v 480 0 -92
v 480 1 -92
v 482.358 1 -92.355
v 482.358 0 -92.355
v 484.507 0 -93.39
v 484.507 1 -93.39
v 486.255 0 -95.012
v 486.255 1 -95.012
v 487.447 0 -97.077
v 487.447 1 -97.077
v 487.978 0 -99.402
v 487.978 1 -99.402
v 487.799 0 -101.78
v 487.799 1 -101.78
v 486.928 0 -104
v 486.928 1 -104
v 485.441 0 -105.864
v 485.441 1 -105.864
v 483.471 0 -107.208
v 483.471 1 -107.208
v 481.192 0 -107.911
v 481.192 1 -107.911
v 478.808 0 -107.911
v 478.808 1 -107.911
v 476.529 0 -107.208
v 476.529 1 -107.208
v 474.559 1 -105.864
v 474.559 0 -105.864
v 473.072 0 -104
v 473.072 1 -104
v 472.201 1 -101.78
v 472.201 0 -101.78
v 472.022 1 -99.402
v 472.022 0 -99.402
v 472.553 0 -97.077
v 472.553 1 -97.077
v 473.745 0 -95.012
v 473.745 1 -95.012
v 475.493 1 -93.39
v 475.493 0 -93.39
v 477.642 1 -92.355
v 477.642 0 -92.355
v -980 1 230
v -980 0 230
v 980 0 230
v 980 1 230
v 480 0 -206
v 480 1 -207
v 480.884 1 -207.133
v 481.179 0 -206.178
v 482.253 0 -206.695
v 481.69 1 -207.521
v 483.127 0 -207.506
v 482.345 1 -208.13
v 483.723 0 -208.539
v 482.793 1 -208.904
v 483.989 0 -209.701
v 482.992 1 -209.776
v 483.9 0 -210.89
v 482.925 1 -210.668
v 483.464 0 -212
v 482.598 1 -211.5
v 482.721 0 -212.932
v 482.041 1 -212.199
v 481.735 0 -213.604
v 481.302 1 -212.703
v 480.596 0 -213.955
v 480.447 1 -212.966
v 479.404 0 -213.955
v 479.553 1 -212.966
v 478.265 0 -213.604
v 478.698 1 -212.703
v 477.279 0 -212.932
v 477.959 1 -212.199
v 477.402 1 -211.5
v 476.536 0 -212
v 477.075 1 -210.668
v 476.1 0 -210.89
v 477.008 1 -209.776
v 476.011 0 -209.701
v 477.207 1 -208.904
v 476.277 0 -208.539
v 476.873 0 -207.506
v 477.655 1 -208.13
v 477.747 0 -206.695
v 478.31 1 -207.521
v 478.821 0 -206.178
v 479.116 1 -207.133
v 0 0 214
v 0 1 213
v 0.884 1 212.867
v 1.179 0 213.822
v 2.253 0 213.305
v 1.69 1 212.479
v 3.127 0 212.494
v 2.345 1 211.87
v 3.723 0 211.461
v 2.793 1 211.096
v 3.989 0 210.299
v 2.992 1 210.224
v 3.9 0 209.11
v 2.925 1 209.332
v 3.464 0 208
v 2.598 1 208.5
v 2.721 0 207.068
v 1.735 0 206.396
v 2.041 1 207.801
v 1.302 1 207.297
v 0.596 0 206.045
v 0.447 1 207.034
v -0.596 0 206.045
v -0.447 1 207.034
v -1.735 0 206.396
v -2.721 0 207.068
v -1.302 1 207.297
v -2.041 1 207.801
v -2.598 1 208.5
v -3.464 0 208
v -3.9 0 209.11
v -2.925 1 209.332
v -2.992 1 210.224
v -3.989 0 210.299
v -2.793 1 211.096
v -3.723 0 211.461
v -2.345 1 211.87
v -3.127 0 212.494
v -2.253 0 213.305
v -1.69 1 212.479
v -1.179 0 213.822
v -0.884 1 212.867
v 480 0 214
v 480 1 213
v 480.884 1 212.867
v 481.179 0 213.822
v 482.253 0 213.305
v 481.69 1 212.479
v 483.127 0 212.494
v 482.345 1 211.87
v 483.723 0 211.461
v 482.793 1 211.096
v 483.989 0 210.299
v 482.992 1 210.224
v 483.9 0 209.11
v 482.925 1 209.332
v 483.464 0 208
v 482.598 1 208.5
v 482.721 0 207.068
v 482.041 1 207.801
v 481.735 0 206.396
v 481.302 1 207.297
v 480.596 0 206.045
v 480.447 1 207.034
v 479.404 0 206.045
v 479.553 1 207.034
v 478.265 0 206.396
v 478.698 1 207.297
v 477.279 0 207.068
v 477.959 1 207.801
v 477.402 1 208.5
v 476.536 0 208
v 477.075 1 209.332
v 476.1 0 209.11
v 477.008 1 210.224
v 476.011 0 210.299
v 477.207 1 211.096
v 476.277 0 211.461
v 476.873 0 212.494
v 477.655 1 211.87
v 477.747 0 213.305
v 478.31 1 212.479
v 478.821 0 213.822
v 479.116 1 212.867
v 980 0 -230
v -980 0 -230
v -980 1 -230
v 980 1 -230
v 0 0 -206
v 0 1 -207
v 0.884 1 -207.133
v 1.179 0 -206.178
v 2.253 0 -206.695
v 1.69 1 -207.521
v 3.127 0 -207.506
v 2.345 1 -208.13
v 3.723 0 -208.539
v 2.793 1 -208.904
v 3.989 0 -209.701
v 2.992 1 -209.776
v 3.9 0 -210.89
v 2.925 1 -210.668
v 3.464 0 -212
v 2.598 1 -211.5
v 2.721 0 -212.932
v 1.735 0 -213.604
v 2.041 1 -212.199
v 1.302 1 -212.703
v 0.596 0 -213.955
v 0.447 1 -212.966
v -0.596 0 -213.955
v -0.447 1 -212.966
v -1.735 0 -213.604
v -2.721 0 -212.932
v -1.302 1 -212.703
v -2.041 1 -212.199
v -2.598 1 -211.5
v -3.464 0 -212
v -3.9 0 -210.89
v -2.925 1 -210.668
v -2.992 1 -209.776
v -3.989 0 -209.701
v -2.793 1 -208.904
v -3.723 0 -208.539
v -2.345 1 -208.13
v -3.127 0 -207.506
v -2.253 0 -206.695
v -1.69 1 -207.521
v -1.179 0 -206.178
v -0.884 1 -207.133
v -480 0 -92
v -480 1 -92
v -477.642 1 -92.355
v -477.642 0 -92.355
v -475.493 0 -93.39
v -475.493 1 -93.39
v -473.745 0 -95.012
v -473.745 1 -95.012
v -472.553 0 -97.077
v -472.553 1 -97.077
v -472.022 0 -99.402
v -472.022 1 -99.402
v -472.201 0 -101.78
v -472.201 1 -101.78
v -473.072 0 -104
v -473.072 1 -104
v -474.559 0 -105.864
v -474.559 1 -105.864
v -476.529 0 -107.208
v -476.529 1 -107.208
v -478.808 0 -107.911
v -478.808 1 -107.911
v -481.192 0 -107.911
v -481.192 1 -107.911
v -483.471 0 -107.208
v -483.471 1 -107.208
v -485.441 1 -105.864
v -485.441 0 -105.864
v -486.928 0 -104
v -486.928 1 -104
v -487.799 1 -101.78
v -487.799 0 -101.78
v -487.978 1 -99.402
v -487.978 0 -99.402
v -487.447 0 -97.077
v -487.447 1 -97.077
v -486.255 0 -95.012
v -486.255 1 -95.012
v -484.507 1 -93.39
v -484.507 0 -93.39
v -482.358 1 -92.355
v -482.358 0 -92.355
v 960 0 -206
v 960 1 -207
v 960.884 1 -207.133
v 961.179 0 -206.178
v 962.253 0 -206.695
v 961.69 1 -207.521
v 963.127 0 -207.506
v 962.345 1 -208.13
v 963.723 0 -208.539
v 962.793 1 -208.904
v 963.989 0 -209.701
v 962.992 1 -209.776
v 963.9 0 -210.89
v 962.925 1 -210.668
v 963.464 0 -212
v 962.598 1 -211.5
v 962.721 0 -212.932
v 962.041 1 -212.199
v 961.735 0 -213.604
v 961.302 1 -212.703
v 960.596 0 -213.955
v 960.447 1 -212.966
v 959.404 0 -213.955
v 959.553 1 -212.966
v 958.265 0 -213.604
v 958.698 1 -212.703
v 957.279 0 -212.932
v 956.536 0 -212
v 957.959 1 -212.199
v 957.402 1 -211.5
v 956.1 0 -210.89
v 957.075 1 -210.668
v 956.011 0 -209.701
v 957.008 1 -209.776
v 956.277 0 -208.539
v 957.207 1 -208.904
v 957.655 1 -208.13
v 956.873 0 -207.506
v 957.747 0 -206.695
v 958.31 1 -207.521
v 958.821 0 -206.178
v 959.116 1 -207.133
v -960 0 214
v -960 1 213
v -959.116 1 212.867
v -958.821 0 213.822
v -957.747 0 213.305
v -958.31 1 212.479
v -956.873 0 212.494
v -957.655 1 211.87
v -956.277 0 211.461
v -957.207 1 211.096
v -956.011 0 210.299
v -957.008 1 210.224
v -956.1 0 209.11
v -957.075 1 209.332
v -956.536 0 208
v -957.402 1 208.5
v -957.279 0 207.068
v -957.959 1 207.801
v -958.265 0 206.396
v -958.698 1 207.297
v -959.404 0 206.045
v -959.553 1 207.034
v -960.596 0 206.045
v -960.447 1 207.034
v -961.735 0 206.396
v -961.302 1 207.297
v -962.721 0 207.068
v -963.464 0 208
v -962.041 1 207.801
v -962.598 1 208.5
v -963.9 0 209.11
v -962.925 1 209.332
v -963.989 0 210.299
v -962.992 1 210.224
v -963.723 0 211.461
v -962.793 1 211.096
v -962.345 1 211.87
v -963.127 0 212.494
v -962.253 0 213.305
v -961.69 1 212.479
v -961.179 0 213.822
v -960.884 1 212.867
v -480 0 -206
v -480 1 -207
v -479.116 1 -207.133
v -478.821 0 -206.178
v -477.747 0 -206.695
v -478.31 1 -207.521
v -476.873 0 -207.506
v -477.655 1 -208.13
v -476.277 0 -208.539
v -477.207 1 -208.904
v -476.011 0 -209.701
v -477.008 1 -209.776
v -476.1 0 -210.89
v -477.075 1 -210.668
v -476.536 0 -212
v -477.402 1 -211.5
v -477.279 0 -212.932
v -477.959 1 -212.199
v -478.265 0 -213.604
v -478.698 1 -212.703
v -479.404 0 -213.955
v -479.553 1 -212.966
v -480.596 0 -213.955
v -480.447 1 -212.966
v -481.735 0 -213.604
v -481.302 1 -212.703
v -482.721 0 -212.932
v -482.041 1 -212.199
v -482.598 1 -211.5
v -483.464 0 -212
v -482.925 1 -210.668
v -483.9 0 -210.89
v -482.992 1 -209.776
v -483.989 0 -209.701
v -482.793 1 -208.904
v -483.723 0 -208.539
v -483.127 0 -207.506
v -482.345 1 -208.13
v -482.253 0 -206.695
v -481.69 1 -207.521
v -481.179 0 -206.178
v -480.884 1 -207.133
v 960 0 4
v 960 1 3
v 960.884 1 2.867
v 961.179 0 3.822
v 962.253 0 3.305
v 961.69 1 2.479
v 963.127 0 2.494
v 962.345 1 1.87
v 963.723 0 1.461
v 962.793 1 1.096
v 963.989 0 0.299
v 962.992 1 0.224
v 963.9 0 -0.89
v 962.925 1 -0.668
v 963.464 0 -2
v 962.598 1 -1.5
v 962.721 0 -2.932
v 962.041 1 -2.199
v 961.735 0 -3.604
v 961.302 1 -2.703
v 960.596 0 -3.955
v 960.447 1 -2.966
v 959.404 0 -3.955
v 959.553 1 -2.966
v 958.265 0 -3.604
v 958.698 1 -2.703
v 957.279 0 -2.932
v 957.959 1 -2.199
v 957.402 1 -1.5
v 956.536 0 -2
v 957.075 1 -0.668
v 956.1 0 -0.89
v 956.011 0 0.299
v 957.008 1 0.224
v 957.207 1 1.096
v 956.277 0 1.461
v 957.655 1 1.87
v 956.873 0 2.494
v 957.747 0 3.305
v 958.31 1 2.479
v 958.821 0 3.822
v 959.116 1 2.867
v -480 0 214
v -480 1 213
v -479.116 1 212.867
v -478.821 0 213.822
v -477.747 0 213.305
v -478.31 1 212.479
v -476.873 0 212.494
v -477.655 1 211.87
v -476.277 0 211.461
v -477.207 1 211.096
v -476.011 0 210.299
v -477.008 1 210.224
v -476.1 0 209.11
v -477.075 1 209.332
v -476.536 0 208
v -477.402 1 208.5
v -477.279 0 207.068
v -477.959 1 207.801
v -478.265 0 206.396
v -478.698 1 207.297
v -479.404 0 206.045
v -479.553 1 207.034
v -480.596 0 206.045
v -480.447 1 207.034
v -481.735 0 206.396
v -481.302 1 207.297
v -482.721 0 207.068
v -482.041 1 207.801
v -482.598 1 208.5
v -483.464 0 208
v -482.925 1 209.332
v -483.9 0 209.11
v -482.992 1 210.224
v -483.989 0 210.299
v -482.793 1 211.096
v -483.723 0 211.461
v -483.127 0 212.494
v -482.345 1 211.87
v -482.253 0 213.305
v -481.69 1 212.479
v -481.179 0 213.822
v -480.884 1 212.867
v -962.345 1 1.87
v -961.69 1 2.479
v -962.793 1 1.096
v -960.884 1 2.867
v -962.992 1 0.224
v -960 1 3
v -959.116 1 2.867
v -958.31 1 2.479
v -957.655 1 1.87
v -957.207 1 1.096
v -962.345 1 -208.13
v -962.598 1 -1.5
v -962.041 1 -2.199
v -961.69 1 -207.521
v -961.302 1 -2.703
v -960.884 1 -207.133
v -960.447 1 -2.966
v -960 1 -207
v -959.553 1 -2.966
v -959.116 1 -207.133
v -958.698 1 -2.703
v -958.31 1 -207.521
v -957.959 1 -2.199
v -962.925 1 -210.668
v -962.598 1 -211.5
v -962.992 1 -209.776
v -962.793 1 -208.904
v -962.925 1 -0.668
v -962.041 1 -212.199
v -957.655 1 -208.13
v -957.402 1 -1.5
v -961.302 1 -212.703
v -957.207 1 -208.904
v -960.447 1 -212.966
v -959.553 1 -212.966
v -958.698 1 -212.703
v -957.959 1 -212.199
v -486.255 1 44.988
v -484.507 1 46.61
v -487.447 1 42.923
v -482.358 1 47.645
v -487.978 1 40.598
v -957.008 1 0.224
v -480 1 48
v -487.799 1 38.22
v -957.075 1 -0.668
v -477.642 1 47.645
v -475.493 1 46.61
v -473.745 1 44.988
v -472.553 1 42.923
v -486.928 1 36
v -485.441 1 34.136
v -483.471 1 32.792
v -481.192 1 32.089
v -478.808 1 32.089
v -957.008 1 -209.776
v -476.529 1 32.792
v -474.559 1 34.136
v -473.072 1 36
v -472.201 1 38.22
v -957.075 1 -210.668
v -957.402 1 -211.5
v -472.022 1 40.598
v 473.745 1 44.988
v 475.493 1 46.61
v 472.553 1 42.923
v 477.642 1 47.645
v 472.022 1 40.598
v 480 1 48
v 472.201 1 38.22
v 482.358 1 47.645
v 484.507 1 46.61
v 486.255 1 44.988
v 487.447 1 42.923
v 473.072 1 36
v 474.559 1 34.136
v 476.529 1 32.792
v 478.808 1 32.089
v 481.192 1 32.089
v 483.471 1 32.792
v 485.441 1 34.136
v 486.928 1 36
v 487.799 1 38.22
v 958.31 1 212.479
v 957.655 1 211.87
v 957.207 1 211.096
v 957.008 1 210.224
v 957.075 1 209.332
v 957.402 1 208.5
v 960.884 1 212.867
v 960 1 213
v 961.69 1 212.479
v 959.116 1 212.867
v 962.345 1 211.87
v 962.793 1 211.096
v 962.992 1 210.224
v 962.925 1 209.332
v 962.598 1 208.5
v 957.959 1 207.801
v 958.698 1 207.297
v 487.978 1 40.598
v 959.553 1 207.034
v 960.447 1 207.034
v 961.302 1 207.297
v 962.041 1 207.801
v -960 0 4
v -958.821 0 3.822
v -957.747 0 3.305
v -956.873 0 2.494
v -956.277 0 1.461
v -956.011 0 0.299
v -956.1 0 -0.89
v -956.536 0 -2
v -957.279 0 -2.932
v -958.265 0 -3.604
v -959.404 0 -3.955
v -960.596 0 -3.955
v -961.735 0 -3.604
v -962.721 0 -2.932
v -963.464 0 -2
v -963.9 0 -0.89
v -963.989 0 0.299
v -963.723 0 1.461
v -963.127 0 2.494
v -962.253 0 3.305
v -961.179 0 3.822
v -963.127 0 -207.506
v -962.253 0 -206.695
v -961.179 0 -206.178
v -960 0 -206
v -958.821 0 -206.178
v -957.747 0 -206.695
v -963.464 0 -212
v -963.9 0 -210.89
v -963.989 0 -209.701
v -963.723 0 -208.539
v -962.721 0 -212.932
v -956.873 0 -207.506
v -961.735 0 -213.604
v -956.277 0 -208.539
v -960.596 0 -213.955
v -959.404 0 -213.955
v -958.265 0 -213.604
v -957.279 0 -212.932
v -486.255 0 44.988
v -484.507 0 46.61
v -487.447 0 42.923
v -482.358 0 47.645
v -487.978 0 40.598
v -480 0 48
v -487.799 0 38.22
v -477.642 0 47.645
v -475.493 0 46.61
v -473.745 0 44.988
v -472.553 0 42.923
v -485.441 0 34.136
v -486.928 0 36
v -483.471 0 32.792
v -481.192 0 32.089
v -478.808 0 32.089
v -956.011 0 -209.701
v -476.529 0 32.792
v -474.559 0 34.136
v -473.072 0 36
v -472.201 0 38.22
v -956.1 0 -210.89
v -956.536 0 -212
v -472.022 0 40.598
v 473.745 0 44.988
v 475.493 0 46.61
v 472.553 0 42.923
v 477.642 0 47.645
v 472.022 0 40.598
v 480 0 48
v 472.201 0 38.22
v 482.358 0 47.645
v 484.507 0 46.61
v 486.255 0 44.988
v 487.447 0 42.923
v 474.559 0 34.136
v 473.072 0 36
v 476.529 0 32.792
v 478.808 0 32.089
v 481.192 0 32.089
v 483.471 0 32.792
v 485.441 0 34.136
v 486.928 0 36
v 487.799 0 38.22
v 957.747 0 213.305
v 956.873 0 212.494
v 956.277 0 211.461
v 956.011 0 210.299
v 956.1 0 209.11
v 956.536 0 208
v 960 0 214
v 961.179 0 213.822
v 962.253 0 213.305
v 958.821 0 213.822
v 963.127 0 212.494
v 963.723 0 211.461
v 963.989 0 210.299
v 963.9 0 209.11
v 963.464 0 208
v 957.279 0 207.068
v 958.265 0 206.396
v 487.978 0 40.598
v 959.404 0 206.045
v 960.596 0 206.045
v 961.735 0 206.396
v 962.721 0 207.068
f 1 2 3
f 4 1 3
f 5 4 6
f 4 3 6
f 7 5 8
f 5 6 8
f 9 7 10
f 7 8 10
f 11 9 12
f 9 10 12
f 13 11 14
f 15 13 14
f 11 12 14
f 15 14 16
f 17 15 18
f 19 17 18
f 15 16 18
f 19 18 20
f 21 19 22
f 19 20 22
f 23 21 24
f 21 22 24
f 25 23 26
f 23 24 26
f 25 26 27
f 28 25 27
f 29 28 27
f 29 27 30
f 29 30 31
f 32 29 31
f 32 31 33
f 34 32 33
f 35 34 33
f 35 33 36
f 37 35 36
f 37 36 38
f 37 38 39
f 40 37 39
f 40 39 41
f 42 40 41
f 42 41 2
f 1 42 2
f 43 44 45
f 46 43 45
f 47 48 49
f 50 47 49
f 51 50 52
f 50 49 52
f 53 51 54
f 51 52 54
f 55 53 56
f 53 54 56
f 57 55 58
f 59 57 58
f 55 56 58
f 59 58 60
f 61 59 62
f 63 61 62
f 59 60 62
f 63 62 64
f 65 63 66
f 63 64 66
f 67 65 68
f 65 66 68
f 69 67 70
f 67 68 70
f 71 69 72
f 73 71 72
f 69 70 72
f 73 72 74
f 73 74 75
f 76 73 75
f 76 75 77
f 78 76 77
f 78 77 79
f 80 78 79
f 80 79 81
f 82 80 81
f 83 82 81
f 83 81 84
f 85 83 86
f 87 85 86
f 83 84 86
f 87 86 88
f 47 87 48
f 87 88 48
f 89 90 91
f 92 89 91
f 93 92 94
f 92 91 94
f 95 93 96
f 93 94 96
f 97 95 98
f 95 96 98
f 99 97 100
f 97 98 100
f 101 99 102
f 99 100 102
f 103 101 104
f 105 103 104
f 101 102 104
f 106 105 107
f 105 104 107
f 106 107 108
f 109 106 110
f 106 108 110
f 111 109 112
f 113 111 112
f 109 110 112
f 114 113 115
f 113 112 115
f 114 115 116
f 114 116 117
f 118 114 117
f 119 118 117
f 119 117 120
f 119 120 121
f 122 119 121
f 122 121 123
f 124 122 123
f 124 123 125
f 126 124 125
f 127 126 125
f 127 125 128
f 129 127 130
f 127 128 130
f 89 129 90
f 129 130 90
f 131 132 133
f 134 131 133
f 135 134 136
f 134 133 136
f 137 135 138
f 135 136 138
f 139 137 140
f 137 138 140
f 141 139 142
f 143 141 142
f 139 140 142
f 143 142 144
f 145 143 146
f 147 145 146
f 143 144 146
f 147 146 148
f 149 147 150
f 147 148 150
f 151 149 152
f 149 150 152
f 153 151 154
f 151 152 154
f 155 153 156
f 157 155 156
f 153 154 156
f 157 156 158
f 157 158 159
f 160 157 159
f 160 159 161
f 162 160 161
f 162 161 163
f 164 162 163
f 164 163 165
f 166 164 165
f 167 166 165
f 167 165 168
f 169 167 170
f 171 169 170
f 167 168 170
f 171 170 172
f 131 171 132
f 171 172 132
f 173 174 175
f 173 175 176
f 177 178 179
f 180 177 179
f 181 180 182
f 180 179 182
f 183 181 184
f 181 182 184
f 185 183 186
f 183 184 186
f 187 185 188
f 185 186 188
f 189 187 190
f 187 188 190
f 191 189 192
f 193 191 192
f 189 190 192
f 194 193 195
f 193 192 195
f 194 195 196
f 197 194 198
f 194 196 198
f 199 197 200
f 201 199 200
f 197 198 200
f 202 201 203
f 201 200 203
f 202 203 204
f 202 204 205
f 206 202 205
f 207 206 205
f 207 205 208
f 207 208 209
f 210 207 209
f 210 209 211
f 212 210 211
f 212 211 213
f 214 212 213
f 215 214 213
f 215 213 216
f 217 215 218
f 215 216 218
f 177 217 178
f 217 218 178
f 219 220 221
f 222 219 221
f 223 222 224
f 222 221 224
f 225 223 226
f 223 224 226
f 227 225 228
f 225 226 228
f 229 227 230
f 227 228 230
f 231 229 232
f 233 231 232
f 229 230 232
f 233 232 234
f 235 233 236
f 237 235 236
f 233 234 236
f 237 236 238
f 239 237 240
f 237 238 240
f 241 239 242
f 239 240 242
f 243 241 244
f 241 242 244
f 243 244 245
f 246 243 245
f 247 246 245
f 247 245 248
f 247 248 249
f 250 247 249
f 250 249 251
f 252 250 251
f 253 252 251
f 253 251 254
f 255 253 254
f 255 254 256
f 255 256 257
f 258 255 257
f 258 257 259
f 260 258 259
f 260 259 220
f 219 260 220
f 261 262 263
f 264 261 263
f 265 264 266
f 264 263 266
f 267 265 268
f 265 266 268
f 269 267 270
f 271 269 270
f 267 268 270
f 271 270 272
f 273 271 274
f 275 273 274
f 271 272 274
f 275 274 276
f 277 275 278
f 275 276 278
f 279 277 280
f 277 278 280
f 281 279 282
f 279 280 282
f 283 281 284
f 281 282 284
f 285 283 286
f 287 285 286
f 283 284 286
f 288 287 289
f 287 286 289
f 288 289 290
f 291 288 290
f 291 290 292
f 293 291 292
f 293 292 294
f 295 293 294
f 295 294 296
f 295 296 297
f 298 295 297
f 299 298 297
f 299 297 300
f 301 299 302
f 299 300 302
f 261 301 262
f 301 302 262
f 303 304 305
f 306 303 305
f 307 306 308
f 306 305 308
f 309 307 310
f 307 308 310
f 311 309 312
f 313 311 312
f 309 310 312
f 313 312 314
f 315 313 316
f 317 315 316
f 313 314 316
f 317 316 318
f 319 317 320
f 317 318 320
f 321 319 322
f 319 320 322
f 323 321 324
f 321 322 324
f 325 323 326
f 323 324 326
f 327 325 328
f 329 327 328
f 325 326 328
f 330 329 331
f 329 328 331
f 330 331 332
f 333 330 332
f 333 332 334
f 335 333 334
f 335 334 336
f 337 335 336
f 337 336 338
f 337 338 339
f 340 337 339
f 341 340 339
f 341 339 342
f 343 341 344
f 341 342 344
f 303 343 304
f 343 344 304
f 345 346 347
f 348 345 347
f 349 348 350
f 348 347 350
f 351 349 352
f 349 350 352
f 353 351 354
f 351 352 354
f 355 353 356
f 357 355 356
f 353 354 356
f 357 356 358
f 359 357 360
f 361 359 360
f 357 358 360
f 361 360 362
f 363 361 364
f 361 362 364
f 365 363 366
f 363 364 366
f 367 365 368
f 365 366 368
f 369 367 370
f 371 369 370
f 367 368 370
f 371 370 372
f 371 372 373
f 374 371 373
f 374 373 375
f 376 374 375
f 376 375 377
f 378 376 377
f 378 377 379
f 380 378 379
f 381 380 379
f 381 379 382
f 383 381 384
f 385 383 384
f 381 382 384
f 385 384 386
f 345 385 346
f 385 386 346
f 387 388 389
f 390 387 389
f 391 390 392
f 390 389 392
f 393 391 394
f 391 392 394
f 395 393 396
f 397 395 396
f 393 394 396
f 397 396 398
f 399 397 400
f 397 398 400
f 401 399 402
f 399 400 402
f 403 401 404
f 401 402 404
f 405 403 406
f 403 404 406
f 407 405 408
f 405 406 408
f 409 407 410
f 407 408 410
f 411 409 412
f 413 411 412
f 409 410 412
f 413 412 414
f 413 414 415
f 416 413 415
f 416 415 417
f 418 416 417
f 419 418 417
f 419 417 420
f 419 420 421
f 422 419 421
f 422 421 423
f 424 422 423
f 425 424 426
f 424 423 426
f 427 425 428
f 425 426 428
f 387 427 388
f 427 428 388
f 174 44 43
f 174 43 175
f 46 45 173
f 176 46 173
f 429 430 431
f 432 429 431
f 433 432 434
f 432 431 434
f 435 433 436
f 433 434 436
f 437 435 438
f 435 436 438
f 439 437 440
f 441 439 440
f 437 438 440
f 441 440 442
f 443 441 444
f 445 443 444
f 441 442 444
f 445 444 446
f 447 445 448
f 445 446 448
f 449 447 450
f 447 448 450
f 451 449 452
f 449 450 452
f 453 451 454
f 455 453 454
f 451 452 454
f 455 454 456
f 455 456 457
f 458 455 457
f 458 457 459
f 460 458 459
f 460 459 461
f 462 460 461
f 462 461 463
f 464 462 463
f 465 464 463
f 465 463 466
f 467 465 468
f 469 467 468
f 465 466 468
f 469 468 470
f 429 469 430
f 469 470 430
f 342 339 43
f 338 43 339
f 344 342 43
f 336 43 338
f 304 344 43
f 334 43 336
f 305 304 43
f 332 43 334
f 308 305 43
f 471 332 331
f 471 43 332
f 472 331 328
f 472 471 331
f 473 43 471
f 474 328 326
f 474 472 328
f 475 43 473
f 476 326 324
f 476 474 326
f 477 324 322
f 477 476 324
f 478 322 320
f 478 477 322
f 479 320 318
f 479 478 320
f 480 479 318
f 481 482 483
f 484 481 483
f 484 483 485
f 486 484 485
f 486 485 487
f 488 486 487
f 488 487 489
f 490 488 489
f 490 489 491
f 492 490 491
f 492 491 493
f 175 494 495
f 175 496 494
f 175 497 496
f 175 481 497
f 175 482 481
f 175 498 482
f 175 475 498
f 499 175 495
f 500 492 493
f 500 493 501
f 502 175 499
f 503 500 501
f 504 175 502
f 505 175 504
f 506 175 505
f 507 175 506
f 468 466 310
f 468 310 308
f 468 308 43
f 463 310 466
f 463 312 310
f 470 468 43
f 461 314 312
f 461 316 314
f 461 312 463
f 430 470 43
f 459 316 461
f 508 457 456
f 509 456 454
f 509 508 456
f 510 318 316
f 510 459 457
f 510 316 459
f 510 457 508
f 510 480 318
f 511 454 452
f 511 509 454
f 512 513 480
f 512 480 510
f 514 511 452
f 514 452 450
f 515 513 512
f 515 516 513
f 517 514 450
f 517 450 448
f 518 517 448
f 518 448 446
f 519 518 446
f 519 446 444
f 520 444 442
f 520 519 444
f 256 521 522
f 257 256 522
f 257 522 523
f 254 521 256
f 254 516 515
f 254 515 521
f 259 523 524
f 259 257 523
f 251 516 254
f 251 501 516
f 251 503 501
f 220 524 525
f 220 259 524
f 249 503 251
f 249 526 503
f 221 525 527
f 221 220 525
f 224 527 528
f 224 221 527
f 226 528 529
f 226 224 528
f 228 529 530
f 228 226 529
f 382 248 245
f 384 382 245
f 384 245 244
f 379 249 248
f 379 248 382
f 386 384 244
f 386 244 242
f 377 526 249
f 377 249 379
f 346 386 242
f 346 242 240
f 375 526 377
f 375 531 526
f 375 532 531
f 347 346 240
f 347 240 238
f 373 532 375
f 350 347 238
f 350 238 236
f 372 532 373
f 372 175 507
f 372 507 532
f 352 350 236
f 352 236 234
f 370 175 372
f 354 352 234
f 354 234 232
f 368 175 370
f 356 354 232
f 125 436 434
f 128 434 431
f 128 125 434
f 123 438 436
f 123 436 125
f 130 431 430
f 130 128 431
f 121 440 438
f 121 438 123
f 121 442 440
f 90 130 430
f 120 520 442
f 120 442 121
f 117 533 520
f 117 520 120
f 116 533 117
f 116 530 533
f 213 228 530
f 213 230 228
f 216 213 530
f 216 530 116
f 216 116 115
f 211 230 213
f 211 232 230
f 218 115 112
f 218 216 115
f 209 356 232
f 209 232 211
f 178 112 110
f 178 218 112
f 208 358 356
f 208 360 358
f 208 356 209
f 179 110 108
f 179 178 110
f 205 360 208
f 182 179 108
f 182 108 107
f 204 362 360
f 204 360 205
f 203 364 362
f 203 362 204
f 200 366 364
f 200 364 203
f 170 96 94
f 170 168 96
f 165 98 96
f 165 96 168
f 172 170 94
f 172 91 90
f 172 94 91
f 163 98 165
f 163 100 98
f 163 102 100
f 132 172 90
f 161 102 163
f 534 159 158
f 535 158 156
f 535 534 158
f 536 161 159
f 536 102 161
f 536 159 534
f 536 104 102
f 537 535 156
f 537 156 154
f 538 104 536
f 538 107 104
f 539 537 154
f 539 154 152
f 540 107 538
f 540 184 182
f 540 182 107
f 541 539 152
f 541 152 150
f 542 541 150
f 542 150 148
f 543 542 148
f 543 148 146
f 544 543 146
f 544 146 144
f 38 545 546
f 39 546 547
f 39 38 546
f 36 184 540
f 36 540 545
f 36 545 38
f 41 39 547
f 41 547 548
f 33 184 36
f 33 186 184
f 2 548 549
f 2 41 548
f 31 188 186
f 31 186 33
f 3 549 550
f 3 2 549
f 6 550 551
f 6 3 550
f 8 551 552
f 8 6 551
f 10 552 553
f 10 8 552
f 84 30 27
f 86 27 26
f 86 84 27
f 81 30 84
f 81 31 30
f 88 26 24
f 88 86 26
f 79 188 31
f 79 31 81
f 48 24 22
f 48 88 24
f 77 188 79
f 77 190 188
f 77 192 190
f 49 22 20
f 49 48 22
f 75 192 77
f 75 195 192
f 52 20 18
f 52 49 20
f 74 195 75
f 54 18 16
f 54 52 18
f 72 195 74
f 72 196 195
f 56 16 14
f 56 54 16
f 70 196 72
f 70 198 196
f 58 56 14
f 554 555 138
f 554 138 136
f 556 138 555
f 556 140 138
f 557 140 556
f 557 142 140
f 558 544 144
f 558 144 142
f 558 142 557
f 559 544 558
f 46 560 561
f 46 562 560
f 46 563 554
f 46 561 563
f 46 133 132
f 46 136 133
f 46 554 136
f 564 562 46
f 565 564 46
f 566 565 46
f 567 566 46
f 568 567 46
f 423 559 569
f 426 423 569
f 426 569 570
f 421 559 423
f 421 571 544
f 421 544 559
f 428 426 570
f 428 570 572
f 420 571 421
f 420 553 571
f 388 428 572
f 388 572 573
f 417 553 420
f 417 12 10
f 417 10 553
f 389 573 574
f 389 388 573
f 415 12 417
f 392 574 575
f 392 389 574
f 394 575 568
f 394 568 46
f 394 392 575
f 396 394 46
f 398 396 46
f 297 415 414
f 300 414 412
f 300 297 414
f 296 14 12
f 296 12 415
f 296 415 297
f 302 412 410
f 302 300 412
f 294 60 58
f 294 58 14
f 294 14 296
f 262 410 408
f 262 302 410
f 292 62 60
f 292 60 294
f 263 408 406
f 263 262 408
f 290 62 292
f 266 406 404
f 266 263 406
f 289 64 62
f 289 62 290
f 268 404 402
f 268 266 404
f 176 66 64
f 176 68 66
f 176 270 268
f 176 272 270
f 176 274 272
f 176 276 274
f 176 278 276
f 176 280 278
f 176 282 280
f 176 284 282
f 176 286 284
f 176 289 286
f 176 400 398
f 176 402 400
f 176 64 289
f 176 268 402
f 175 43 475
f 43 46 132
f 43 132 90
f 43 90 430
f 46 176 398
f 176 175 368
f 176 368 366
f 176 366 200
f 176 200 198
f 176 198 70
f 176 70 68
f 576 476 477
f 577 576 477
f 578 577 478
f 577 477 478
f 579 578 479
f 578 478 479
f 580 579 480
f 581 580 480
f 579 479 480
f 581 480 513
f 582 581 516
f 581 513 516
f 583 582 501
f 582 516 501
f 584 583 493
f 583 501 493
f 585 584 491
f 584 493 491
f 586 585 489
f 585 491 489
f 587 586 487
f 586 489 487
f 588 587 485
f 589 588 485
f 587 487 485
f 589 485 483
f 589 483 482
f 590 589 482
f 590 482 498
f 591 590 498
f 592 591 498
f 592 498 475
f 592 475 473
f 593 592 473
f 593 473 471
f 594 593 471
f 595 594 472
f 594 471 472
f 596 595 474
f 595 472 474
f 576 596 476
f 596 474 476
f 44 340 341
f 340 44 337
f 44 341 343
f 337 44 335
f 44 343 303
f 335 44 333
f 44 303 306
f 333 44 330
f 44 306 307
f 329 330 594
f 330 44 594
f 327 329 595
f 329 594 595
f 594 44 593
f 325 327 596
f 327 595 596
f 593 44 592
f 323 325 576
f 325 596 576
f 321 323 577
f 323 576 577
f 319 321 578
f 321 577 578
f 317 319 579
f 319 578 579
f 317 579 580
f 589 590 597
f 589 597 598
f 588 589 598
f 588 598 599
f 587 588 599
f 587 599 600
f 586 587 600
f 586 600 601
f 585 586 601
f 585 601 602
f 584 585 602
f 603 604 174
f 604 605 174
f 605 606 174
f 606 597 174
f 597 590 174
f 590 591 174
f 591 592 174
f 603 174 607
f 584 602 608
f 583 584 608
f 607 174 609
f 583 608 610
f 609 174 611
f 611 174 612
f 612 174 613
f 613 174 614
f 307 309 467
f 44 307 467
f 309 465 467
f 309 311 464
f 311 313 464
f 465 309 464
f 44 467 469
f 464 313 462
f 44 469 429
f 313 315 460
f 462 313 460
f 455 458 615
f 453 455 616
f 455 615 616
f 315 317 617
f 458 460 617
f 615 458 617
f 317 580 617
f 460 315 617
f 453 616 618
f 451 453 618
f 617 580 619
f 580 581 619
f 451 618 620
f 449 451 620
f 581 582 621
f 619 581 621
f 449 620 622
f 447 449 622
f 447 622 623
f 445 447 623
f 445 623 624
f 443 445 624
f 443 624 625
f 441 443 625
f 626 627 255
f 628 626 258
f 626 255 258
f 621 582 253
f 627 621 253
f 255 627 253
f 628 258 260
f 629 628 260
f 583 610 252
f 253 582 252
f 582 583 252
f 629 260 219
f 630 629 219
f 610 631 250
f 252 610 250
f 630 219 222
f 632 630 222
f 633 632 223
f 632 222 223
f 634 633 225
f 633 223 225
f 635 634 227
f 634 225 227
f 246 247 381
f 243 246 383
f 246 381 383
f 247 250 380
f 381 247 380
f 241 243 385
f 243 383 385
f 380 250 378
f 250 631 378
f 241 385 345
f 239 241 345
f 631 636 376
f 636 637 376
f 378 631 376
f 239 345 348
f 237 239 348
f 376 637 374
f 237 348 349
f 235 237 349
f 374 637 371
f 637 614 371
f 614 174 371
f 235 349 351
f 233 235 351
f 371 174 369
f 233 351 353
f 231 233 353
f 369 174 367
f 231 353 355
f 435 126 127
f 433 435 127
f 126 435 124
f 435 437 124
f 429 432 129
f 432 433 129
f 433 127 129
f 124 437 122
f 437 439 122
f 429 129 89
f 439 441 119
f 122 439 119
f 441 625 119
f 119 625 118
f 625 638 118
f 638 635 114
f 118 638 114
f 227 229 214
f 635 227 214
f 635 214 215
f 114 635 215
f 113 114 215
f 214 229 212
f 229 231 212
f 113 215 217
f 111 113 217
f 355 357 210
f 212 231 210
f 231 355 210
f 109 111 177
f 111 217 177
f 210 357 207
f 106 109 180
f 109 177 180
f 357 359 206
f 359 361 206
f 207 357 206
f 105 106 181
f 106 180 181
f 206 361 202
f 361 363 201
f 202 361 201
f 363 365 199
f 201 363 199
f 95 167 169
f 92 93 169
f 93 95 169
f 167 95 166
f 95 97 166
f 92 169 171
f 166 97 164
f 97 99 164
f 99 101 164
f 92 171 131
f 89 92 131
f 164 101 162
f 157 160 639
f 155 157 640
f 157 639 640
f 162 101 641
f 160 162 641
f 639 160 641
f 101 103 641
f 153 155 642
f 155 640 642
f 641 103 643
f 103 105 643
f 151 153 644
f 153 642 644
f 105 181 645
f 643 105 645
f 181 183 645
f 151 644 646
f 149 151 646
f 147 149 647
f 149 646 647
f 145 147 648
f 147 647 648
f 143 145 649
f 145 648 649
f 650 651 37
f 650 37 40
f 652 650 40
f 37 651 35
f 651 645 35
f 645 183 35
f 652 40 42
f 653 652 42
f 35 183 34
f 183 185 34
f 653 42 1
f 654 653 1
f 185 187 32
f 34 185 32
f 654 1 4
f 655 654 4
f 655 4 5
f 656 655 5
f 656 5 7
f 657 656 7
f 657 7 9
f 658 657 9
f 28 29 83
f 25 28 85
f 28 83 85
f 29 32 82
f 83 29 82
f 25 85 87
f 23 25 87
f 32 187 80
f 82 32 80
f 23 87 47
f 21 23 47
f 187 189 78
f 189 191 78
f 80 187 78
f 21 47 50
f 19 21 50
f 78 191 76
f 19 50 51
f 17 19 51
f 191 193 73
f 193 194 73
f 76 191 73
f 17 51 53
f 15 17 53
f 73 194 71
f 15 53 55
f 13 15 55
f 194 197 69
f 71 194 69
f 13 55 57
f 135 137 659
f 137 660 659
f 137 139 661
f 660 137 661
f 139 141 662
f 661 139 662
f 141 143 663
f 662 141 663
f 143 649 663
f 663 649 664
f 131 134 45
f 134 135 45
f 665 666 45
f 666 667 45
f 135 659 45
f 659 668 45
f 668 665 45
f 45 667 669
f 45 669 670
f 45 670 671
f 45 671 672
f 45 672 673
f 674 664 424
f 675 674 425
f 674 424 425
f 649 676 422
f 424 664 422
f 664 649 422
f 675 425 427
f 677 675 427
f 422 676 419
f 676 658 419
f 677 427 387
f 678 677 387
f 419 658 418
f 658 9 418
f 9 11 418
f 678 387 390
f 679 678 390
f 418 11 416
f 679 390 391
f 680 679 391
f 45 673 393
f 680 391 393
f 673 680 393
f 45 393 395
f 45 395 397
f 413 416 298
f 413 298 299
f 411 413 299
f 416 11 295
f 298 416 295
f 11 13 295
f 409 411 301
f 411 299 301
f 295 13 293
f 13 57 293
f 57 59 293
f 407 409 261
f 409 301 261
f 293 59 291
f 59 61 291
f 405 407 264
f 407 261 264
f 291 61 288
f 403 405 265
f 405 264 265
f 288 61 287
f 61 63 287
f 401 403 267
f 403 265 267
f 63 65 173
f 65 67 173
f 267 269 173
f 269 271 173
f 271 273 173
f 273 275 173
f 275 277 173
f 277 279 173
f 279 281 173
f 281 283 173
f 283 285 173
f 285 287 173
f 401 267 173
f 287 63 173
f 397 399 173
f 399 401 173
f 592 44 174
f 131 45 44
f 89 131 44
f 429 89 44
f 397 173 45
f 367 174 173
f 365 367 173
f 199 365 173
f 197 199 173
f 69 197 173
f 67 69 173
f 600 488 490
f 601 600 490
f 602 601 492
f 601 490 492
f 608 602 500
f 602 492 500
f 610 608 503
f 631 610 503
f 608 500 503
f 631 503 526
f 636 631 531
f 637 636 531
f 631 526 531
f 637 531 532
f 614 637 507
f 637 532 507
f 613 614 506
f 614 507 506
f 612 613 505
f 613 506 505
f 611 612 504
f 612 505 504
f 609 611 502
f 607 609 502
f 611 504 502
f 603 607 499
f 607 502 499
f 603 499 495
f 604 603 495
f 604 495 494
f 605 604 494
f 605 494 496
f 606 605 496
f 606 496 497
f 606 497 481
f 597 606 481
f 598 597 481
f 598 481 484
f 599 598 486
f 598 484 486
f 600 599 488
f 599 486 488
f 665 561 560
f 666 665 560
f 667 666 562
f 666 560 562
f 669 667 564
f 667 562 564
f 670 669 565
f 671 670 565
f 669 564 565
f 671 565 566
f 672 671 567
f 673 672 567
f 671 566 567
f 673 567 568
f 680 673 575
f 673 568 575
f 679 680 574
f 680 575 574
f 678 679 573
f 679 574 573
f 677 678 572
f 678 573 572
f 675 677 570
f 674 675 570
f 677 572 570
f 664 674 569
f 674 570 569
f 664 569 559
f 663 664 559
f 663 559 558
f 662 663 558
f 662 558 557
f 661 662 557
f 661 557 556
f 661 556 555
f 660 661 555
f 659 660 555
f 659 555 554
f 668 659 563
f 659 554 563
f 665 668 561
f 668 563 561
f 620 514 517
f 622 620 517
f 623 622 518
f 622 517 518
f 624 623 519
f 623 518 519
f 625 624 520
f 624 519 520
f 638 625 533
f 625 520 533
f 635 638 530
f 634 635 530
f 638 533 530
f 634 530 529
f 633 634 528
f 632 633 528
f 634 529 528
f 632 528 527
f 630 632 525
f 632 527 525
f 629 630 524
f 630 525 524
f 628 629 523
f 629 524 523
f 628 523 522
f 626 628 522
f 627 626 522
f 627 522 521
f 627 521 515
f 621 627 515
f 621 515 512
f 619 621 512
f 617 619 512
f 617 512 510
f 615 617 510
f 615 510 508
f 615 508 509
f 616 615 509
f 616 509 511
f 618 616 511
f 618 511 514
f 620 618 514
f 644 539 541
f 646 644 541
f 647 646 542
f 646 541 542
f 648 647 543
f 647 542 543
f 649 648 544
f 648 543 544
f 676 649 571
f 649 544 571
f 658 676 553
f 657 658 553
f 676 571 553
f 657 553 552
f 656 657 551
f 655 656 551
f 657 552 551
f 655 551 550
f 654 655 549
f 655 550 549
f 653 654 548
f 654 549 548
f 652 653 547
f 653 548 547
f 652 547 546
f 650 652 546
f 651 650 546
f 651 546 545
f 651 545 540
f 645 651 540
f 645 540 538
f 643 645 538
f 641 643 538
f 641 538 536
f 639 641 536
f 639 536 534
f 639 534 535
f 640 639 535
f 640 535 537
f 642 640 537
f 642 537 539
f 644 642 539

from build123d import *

# Parameters (mm, degrees)
SKETCH1_W           = 1960
SKETCH1_H           = 460
BOSS_EXTRUDE1_DEPTH = 1
SKETCH2_R           = 8
SKETCH2_R_2         = 3
CUT_EXTRUDE1_DEPTH  = 1007.628531286
CHAMFER1_SIZE       = 1


with BuildPart() as part:
    # Sketch1 → Boss-Extrude1 (new body)
    with BuildSketch(Plane(origin=(0, 0, 0), x_dir=(1, 0, 0), z_dir=(0, 1, 0))):
        Rectangle(SKETCH1_W, SKETCH1_H)
    extrude(amount=BOSS_EXTRUDE1_DEPTH)

    # Sketch2 → Cut-Extrude1 (cut, through all)
    with BuildSketch(Plane(origin=(0, 1, 0), x_dir=(1, 0, 0), z_dir=(0, 1, 0))):
        with Locations(Location((480, -40, 0), (0, 0, 270))):
            Circle(SKETCH2_R)
        with Locations(Location((-480, -40, 0), (0, 0, 270))):
            Circle(SKETCH2_R)
        with Locations(Location((-480, 100, 0), (0, 0, 270))):
            Circle(SKETCH2_R)
        with Locations(Location((480, 100, 0), (0, 0, 270))):
            Circle(SKETCH2_R)
        with Locations(Location((960, -210, 0), (0, 0, 270))):
            Circle(SKETCH2_R_2)
        with Locations(Location((-960, -210, 0), (0, 0, 270))):
            Circle(SKETCH2_R_2)
        with Locations(Location((-960, 210, 0), (0, 0, 270))):
            Circle(SKETCH2_R_2)
        with Locations(Location((960, 210, 0), (0, 0, 270))):
            Circle(SKETCH2_R_2)
        with Locations(Location((-960, 0, 0), (0, 0, 270))):
            Circle(SKETCH2_R_2)
        with Locations(Location((960, 0, 0), (0, 0, 270))):
            Circle(SKETCH2_R_2)
        with Locations(Location((0, -210, 0), (0, 0, 270))):
            Circle(SKETCH2_R_2)
        with Locations(Location((0, 210, 0), (0, 0, 270))):
            Circle(SKETCH2_R_2)
        with Locations(Location((480, -210, 0), (0, 0, 270))):
            Circle(SKETCH2_R_2)
        with Locations(Location((-480, -210, 0), (0, 0, 270))):
            Circle(SKETCH2_R_2)
        with Locations(Location((-480, 210, 0), (0, 0, 270))):
            Circle(SKETCH2_R_2)
        with Locations(Location((480, 210, 0), (0, 0, 270))):
            Circle(SKETCH2_R_2)
    extrude(amount=-CUT_EXTRUDE1_DEPTH, mode=Mode.SUBTRACT)

    # Chamfer1
    chamfer1_edges = [part.edges().sort_by_distance(p)[0] for p in [
        (-960, 0, 207),
        (-960, 0, -213),
        (960, 0, -213),
        (-960, 0, -3),
        (960, 0, 207),
        (480, 0, -213),
        (-480, 0, -213),
        (-480, 0, 207),
        (960, 0, -3),
        (0, 0, 207),
        (0, 0, -213),
        (480, 0, 207),
    ]]
    chamfer(chamfer1_edges, length=CHAMFER1_SIZE - 0.0001)  # a hair under: the kernel refuses the full size


solid = part.part
